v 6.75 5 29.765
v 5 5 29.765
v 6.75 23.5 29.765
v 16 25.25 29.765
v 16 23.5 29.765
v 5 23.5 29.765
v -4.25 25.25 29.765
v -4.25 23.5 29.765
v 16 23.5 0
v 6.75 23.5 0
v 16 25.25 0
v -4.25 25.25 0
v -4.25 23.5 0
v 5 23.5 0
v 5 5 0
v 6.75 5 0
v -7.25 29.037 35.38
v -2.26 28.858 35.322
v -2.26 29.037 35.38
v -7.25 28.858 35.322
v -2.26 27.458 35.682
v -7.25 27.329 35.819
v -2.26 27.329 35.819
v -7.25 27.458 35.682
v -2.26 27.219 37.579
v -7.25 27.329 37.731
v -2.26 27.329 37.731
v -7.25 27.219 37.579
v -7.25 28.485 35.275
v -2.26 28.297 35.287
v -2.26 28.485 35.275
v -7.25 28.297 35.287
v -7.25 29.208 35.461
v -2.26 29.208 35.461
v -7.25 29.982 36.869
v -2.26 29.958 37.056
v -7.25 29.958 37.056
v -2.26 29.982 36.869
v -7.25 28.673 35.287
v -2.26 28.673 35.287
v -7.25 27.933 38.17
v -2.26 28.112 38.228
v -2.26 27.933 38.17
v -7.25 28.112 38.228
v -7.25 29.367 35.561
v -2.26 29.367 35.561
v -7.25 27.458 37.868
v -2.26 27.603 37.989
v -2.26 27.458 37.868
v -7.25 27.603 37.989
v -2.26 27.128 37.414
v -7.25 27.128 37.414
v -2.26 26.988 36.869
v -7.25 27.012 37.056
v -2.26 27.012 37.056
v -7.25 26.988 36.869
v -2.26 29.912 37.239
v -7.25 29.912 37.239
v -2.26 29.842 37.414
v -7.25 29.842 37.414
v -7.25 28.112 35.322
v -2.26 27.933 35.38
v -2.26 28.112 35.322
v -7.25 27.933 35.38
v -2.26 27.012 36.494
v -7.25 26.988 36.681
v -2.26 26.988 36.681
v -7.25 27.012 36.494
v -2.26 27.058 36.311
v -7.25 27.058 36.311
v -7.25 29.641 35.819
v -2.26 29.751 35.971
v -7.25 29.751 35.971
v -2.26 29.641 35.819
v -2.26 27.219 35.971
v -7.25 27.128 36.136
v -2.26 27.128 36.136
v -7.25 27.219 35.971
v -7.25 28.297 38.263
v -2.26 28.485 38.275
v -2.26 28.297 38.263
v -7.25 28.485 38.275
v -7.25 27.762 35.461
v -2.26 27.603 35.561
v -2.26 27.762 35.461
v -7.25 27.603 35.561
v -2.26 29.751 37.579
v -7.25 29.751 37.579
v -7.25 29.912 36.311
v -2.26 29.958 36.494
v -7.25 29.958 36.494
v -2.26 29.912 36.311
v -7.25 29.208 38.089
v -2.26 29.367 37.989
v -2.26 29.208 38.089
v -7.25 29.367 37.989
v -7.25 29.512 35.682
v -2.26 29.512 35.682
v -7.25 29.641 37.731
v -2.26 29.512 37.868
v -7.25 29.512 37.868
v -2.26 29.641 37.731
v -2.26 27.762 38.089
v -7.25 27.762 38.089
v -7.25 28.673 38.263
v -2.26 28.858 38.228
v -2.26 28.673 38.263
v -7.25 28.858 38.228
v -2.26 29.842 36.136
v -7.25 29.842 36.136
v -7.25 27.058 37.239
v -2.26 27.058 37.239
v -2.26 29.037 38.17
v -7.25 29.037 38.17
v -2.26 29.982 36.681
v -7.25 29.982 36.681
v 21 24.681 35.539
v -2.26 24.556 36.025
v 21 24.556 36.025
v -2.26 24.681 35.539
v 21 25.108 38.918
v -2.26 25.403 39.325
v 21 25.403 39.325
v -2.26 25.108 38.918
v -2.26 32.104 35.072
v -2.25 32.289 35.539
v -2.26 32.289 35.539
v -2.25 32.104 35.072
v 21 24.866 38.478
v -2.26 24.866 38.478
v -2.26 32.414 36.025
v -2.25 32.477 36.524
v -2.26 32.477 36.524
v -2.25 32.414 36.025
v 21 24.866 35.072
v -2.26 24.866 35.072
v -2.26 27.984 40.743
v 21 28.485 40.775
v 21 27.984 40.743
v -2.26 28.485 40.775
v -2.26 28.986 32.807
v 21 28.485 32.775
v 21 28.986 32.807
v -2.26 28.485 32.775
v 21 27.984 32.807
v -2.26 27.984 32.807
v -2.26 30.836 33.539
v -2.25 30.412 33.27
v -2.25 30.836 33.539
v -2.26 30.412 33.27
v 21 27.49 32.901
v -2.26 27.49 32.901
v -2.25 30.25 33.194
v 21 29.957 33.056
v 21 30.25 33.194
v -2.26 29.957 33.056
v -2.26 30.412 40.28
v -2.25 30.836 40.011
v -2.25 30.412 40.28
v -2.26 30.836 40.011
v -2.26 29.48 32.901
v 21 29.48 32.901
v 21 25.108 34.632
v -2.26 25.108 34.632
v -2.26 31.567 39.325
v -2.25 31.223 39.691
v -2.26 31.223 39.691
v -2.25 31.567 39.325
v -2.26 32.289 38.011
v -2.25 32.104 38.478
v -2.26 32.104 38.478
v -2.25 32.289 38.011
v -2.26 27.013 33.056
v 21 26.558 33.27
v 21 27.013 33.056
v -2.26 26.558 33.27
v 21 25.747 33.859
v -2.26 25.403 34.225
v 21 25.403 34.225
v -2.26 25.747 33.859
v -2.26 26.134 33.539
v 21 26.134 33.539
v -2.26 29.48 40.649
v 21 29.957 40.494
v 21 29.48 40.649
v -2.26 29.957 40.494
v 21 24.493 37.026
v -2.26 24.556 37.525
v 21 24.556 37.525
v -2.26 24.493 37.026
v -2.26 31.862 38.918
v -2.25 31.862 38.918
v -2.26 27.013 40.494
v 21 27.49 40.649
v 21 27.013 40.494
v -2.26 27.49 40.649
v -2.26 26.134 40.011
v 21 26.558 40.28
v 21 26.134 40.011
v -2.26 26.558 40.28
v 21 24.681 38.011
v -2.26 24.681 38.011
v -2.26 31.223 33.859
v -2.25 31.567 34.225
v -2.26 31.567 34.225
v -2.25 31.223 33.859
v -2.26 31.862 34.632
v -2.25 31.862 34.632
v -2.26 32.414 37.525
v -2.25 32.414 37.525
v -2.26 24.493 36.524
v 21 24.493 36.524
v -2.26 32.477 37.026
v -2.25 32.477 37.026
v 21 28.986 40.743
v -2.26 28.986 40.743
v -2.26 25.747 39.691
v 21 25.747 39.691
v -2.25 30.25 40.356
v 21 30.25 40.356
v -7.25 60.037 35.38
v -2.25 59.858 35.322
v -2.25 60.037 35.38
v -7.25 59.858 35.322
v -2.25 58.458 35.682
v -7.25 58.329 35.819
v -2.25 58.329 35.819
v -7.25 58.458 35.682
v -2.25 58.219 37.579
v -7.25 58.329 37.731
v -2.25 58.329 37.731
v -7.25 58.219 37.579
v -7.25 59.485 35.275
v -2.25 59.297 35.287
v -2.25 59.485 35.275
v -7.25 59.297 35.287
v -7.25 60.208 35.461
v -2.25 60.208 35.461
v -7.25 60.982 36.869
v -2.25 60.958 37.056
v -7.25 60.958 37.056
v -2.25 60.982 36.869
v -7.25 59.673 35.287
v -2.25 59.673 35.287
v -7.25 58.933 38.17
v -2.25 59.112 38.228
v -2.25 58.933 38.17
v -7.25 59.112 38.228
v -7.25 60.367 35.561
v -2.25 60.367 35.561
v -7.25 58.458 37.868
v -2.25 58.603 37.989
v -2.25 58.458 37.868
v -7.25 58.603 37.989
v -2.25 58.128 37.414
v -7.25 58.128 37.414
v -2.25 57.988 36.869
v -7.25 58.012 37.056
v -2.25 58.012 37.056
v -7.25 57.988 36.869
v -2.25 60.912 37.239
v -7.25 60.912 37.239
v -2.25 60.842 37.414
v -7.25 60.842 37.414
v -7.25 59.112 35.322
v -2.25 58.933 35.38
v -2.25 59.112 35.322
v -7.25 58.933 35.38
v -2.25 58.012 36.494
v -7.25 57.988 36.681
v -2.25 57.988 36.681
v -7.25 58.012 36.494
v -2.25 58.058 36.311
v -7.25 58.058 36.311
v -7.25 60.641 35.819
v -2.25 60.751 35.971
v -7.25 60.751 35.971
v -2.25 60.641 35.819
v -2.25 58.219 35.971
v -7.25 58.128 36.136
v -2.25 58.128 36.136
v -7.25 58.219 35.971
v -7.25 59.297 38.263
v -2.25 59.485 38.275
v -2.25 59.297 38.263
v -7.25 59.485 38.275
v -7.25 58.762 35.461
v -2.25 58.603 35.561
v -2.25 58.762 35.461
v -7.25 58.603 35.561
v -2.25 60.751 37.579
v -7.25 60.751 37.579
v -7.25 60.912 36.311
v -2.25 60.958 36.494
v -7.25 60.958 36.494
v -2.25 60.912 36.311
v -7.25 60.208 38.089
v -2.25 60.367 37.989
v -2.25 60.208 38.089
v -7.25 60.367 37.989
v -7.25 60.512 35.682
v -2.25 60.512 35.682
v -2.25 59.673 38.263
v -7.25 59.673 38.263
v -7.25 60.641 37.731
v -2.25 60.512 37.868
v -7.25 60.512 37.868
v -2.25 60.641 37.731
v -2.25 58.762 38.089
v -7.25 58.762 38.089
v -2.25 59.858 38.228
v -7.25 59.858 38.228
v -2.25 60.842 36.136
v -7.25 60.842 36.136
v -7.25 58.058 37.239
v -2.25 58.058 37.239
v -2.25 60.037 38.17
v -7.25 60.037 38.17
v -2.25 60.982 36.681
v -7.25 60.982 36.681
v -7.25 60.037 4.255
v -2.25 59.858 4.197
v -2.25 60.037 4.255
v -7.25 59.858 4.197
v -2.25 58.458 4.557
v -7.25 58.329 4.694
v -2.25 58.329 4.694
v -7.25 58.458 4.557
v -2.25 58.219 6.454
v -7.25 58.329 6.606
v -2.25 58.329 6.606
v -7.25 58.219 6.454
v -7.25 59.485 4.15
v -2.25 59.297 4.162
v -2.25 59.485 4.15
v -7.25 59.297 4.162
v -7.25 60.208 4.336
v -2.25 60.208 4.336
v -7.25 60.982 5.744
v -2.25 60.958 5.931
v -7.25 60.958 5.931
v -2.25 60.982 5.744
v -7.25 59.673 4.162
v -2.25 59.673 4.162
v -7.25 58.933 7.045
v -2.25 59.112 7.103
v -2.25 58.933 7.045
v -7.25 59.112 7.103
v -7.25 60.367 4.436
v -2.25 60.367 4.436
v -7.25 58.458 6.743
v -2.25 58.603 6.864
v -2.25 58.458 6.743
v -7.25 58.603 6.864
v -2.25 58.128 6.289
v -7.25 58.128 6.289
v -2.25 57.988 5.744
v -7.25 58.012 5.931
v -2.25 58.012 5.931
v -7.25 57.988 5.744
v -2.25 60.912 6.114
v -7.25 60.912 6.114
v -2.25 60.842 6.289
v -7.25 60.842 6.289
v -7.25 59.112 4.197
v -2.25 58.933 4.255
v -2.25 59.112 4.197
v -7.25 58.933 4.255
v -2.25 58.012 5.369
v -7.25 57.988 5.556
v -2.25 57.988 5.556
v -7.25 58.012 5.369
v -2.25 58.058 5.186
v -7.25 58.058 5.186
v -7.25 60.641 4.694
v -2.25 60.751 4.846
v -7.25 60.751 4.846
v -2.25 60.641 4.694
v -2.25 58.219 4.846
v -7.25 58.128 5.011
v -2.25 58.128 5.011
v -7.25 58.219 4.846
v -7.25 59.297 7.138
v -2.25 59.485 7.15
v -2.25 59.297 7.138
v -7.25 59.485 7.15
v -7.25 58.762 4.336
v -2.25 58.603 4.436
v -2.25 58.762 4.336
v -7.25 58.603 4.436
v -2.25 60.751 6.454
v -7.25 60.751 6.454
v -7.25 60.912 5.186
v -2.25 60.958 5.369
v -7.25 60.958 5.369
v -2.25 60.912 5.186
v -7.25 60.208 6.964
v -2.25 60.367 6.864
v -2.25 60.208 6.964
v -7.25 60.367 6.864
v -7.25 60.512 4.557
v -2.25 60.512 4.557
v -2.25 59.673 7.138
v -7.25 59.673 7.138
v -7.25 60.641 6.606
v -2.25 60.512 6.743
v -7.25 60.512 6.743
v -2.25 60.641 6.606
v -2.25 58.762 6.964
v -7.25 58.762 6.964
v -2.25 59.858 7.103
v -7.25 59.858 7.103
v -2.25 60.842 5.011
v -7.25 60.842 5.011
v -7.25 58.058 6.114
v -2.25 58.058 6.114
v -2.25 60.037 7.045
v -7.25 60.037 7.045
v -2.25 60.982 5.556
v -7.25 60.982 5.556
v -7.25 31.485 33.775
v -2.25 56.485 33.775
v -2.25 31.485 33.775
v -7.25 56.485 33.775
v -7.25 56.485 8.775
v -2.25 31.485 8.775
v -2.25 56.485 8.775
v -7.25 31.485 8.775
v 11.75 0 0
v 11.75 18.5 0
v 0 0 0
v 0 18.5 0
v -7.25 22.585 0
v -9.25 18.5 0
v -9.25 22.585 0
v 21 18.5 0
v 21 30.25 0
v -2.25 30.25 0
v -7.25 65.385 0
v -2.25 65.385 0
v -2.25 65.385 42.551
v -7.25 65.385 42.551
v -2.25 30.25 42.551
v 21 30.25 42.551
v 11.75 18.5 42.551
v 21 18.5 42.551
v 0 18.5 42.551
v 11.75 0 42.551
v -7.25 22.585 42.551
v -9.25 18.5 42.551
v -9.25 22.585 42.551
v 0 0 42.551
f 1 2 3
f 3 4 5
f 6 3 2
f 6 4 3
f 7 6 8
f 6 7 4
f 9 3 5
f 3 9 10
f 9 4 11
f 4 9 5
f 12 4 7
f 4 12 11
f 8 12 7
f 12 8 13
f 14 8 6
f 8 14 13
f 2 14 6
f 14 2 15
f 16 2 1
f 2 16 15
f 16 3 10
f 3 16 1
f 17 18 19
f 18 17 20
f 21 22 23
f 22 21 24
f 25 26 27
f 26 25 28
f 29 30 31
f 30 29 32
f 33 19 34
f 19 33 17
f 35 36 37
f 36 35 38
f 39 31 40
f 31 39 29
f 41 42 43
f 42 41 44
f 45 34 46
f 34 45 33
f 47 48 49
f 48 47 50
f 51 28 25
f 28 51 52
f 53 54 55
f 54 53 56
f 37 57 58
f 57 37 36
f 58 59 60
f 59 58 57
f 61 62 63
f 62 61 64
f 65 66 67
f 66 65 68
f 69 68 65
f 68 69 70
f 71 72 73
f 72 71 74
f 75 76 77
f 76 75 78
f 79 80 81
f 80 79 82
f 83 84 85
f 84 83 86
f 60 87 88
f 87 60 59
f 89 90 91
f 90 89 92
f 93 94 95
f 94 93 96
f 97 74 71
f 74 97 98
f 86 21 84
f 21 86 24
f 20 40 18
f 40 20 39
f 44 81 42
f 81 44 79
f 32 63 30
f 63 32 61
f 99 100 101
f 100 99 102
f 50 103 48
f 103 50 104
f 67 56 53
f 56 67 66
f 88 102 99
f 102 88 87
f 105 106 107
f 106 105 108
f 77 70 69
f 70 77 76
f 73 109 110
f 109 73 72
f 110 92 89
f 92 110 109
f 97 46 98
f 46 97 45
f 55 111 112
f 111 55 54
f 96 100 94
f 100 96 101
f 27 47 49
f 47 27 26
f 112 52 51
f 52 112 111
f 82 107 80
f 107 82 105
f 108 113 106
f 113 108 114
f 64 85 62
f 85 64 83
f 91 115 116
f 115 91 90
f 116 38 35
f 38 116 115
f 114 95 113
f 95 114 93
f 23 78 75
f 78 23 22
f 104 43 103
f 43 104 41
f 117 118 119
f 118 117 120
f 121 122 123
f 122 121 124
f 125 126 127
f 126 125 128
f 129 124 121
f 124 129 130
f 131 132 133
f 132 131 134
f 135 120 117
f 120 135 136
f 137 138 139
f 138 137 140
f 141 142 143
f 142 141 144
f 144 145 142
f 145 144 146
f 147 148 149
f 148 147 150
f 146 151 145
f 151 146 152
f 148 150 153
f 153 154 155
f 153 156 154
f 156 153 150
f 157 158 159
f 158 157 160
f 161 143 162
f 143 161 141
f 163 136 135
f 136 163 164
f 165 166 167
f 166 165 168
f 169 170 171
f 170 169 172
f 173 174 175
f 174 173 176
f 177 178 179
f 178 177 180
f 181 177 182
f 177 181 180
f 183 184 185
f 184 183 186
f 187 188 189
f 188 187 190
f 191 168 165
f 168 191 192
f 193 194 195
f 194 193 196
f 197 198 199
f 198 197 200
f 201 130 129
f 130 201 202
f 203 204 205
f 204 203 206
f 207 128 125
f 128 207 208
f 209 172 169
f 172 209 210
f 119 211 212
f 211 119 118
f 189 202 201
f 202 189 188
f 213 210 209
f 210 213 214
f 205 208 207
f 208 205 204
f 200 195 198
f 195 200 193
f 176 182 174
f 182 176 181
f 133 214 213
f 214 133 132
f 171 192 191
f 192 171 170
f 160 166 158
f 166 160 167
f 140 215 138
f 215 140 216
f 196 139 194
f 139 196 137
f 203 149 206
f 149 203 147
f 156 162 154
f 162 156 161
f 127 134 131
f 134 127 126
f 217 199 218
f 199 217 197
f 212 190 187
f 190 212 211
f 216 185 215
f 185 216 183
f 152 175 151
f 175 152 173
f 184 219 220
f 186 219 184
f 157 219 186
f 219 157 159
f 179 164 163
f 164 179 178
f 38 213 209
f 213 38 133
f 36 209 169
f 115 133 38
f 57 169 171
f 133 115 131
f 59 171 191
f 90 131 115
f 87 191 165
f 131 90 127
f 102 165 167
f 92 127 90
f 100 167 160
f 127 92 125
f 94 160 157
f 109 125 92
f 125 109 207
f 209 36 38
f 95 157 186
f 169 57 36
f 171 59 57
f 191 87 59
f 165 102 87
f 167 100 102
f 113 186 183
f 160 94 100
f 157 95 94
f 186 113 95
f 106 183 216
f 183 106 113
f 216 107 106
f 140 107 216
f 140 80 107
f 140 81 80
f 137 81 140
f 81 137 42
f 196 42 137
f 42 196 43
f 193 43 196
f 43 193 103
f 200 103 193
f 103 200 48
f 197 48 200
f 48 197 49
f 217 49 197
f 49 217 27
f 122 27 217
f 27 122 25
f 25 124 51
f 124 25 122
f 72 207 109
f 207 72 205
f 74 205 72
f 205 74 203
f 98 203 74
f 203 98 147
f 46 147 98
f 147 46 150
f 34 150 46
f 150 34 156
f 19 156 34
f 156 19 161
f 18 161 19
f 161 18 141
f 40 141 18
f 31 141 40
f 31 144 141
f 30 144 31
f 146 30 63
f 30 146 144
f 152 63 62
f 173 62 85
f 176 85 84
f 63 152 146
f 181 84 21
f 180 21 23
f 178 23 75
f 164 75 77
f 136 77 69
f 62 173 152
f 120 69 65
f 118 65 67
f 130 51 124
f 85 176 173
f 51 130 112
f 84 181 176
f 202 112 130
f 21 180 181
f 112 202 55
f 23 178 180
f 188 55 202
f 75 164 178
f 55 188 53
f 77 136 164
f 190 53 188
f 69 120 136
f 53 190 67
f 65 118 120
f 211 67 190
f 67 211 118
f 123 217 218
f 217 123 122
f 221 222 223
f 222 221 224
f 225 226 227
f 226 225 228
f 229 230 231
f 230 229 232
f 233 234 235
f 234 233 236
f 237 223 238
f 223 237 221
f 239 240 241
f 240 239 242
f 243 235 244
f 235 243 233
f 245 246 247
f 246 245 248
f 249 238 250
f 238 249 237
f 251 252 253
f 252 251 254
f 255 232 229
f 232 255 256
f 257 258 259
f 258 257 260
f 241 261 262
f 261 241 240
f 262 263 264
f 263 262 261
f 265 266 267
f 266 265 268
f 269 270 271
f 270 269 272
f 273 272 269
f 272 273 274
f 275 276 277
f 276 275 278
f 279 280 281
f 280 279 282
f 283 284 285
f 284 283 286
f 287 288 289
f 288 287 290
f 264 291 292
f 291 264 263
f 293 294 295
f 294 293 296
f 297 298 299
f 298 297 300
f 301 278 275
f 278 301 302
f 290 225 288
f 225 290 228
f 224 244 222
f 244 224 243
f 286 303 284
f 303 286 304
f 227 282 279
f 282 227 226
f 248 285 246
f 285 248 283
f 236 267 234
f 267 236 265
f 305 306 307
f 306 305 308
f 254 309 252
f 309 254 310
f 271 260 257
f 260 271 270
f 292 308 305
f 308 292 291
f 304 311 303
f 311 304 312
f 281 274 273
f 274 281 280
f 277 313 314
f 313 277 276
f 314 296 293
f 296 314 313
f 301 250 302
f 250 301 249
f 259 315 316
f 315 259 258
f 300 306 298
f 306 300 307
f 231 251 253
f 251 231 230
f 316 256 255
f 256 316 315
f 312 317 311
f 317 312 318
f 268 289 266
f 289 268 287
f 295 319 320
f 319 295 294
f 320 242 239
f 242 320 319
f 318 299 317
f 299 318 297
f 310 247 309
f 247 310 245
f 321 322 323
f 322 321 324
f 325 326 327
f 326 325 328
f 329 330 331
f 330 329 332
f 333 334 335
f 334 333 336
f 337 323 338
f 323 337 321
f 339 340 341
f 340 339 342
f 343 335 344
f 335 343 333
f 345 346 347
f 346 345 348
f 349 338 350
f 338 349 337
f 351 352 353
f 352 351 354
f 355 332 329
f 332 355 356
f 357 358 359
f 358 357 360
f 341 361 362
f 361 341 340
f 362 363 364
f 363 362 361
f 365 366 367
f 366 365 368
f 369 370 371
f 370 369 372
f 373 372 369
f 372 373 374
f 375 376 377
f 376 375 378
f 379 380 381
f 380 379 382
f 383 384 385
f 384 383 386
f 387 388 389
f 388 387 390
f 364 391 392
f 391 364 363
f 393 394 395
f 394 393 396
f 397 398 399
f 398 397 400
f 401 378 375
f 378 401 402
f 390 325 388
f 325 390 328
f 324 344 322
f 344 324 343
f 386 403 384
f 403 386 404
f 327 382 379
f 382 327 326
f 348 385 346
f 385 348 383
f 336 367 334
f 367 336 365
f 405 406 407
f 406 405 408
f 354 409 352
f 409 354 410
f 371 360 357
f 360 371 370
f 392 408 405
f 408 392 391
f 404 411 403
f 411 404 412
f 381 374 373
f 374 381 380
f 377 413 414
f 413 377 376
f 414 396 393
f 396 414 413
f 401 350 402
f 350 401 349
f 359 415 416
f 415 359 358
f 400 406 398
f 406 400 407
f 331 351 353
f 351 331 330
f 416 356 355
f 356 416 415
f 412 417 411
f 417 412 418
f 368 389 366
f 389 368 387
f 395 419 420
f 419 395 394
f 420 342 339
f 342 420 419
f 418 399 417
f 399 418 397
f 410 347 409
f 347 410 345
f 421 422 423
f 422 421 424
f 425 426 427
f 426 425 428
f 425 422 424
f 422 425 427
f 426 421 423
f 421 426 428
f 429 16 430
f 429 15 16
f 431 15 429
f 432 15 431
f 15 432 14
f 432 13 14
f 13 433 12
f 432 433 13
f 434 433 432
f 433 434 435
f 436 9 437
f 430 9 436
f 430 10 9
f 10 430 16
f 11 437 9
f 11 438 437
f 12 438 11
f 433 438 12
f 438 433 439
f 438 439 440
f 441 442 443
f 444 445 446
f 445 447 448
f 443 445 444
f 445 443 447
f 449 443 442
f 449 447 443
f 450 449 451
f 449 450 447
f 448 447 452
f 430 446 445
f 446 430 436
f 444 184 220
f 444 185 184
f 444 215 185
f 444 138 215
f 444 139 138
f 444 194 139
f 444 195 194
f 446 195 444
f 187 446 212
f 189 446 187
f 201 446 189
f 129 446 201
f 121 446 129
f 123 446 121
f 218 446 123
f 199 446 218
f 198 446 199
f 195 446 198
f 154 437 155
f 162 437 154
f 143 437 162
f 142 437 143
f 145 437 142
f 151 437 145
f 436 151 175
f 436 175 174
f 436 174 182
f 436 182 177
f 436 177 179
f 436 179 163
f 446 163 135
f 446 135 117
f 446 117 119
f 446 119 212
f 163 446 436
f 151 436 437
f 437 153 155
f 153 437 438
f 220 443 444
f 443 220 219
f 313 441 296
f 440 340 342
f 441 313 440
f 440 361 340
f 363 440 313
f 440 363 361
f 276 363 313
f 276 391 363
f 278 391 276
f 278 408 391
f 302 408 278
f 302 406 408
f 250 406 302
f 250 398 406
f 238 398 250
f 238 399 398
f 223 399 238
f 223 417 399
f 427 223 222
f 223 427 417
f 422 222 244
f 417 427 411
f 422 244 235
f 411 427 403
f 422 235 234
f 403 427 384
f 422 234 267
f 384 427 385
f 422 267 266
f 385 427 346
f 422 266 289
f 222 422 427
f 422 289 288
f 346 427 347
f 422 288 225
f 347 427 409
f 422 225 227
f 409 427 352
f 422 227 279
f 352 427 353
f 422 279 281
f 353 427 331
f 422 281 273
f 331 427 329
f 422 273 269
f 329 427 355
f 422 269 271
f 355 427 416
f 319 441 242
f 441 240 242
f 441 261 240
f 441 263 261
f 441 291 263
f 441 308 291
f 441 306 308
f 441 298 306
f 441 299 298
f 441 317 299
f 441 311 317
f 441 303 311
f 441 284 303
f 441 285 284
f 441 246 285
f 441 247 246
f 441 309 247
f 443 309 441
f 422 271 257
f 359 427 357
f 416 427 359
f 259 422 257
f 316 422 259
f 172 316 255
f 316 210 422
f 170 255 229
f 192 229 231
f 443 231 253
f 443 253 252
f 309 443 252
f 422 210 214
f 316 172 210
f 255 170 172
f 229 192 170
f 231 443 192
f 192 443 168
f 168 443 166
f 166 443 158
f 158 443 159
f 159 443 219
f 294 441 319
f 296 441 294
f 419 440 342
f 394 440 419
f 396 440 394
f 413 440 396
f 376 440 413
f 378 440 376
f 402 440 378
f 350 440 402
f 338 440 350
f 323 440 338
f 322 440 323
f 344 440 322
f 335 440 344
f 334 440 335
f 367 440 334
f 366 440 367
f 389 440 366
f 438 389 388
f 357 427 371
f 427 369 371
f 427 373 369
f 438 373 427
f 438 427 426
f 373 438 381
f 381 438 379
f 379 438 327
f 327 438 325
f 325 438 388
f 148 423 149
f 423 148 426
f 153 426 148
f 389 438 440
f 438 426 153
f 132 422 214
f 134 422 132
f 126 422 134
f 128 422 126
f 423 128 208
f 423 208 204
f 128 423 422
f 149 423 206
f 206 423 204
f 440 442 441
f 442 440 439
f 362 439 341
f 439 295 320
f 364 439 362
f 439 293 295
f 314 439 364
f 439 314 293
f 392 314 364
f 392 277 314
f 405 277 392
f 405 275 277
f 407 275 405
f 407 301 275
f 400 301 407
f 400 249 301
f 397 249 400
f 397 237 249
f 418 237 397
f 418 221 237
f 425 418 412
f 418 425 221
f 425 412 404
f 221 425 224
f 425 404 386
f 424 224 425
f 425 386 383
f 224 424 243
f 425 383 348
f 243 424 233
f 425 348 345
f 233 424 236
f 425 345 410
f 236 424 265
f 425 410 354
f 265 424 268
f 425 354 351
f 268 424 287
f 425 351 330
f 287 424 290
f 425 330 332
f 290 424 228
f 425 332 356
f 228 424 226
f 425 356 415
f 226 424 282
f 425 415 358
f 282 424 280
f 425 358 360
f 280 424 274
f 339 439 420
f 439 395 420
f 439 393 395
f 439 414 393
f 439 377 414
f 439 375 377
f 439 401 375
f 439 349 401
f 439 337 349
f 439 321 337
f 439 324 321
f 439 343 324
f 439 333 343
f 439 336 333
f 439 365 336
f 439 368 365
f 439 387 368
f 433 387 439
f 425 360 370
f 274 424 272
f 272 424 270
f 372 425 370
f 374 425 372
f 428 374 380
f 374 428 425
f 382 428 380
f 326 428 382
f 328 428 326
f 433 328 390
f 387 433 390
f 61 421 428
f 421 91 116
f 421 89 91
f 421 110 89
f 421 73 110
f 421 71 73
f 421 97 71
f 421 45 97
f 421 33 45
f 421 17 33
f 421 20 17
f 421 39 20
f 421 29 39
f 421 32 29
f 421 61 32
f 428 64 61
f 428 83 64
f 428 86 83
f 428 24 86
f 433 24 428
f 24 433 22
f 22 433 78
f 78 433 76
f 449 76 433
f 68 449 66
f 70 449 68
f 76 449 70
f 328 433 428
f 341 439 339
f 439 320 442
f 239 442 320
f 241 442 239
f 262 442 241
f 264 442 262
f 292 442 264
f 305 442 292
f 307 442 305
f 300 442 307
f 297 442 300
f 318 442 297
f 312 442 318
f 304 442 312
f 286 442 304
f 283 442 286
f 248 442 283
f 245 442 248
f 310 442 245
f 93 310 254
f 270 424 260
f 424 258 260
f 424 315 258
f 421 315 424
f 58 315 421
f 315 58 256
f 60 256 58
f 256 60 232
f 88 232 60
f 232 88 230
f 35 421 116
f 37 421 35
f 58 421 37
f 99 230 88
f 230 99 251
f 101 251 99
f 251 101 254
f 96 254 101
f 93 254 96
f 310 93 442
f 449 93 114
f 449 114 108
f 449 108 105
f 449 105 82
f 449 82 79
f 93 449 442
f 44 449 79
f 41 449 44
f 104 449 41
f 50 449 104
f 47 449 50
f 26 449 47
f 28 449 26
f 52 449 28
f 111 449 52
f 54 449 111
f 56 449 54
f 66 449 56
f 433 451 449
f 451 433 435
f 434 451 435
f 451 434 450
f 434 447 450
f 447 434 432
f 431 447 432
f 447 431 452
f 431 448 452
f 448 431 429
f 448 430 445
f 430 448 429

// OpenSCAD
/*
Projet ReprapJeanne

Sysème de fixation du moteur en haut d'un axe. "T carré 20x20 alu"

github: https://github.com/gnieark/reprapJeanne
wiki https://mail.jeannedhack.org/wicked/display.php?page=reprap_geante

By Gnieark https://blog-du-grouik.tinad.fr
& TranKILLoman   

License GNU-GPL V3

*/


topAxis();
module topAxis(){
  difference(){
	  union(){
	    linear_extrude(42.551)
		  polygon (points=[
		  [0,0],[11.75,0],[11.75,18.5],[21,18.5],[21,30.25],[-2.25,30.25],[-2.25,65.385],[0.75,65.385],[-7.25,65.385],[-7.25,22.585],[-9.25,22.585],[-9.25,18.5],[0,18.5]
		  ]);

  translate([-4.2,5.1,42.55])
			linear_extrude (height=5)
				import (file="all.dxf", layer="top-fix-profil2", $fn=100);
	  }
	  union(){
		  //emplacement du profil T
		  translate([0,0,-0.01])
			  linear_extrude(29.775)
				  polygon (points=[
		  [5,5],[6.75,5],[6.75,23.5],[16,23.5],[16,25.25],[-4.25,25.25],[-4.25,23.5],[5,23.5]
	  ]);

		  //les 3 vis fixation du moteur
		  translate([-7.4,28.485,36.775]) rotate([0,90,0]) cylinder(h=6,r=1.5,$fn=50);
		  translate([-2.26,28.485,36.775]) rotate([0,90,0]) cylinder(h=30,r=4,$fn=50);
		  translate([-7.4,59.485,36.775]) rotate([0,90,0]) cylinder(h=6,r=1.5,$fn=50);
		  translate([-7.4,59.485,5.65]) rotate([0,90,0]) cylinder(h=6,r=1.5,$fn=50);
		  //trou carré pour le moteur
		  translate([-7.4,31.485,8.775]) cube([6,25,25]);
		  //vis plus larges pour plaque au dessus
		  translate([-2.8563,13.4208,42.54]) cylinder(h=6,r=2,$fn=50);
		  translate([14.6063,13.4208,42.54]) cylinder(h=6,r=2,$fn=50);
		  translate([-3.25,69.358,42.54]) cylinder(h=6,r=2,$fn=50);
	  }
  }
}
